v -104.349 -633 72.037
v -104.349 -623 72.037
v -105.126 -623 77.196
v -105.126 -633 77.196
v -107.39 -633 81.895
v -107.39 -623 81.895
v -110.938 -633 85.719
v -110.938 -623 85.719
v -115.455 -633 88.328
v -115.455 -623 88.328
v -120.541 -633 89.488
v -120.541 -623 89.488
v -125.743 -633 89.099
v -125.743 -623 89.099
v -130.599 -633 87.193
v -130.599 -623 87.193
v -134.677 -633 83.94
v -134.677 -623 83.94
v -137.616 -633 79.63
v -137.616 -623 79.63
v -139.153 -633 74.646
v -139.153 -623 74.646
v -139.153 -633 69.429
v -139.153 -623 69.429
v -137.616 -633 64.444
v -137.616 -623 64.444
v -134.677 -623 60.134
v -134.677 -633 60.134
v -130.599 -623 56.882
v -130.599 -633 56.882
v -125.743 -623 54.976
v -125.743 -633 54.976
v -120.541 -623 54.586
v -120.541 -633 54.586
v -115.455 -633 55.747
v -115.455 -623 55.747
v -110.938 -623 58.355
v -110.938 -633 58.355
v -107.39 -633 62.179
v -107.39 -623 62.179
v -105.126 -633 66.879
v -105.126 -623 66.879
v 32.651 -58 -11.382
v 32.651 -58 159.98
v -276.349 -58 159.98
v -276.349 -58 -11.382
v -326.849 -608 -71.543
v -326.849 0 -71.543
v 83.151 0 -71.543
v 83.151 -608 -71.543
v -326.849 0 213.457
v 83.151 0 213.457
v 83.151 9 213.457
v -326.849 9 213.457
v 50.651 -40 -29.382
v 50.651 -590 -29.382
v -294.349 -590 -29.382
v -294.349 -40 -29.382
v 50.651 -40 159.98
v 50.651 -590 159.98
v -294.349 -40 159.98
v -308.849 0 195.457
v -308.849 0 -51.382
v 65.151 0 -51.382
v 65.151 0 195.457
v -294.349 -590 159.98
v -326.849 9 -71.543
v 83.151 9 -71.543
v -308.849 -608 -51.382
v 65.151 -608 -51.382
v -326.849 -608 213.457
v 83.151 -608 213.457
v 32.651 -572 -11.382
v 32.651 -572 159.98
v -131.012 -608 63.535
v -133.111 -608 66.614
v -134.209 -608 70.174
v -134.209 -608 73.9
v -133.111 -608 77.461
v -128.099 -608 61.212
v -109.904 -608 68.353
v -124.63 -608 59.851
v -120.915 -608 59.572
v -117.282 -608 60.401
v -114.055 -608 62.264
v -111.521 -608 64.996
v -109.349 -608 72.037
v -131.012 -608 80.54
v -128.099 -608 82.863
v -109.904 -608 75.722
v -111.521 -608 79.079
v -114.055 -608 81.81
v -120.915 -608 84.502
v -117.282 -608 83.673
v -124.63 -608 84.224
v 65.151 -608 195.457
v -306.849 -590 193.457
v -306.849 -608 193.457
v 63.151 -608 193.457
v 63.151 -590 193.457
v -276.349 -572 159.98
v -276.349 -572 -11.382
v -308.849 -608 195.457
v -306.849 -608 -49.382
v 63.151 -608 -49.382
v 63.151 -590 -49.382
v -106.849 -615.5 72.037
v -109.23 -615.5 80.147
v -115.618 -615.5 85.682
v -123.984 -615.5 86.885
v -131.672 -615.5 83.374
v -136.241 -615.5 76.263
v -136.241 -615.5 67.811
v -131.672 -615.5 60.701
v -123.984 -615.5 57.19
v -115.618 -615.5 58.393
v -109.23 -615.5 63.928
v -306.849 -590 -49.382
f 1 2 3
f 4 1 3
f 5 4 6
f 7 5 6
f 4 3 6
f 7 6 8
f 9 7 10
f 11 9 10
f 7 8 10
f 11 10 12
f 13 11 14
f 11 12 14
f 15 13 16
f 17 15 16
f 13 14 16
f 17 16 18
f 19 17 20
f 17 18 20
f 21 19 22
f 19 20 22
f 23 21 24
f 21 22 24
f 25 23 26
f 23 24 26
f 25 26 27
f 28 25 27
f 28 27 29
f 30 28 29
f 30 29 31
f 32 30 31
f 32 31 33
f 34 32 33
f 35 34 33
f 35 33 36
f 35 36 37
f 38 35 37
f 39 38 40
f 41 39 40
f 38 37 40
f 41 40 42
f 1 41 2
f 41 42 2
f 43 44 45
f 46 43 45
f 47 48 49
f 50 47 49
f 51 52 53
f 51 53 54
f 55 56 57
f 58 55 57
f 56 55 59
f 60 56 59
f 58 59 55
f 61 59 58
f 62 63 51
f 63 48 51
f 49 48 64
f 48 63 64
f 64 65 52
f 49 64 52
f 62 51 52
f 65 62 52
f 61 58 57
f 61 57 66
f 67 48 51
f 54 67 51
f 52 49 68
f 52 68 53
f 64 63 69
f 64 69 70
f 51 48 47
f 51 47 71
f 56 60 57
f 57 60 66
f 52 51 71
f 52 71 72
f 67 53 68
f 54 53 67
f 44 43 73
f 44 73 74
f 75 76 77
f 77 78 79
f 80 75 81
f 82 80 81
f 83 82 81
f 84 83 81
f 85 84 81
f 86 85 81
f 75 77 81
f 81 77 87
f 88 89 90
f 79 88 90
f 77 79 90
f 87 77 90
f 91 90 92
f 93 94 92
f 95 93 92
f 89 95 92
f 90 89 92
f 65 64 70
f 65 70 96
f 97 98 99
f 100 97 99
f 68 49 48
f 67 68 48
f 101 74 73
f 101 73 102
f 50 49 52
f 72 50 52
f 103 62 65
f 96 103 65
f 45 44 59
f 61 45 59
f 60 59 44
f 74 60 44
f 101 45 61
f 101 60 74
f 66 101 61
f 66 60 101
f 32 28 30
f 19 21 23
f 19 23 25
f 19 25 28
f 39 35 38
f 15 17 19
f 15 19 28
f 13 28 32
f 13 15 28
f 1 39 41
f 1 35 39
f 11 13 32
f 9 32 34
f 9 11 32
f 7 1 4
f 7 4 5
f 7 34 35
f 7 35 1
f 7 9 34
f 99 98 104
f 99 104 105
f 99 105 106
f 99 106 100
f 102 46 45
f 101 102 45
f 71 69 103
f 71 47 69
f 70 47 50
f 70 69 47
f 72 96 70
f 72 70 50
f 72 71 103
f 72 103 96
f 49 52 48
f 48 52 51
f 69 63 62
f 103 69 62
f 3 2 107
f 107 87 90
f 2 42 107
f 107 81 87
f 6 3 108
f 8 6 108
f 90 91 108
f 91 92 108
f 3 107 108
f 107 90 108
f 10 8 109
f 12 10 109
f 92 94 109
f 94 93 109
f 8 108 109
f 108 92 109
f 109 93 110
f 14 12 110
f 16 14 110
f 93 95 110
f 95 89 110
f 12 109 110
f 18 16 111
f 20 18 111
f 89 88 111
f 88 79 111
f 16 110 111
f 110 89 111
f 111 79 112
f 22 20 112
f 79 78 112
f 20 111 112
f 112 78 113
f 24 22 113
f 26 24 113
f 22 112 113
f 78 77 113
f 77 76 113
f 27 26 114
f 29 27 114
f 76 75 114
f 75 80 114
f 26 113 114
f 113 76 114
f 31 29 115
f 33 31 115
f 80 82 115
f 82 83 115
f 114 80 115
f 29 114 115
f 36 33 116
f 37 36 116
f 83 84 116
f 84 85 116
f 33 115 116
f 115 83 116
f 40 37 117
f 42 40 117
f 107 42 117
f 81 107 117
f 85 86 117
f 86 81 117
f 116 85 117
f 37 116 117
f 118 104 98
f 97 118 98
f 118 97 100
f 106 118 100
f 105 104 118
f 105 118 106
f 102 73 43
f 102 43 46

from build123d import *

# Parameters (mm, degrees)
F0_W      = 410
F0_H      = 285
F0_W_2    = 374
F0_H_2    = 246.838547
F1_DEPTH  = 608
F2_W      = 410
F2_H      = 285
F3_DEPTH  = 9
F4_W      = 370
F4_H      = 242.838547
F5_DEPTH  = 18
F6_W      = 345
F6_H      = 189.362255
F7_DEPTH  = 550
F8_T      = -18
F9_R      = 17.5
F10_DEPTH = 25
F11_SIZE2 = 5
F11_SIZE  = 15


with BuildPart() as f1:
    # F0 (on Front) → F1 (new body)
    with BuildSketch(Plane.XZ):
        with Locations((-121.848952, 70.956648)):
            Rectangle(F0_W, F0_H)
        with Locations((-121.848952, 72.037374)):
            Rectangle(F0_W_2, F0_H_2, mode=Mode.SUBTRACT)
    extrude(amount=F1_DEPTH)


with BuildPart() as f3:
    # F2 (on face) → F3 (new body)
    with BuildSketch(Plane(origin=(0, 0, 0), x_dir=(-1, 0, 0), z_dir=(0, 1, 0))):
        with Locations((121.848952, 70.956648)):
            Rectangle(F2_W, F2_H)
    extrude(amount=F3_DEPTH)


with BuildPart() as f5:
    # F4 (on face) → F5 (new body)
    with BuildSketch(Plane.XZ.offset(608)):
        with Locations((-121.848952, 72.037374)):
            Rectangle(F4_W, F4_H)
    extrude(amount=-F5_DEPTH)


with BuildPart() as f7:
    # F6 (on face) → F7 (new body)
    with BuildSketch(Plane(origin=(0, -590, 0), x_dir=(-1, 0, 0), z_dir=(0, 1, 0))):
        with Locations((121.848952, 65.299228)):
            Rectangle(F6_W, F6_H)
    extrude(amount=F7_DEPTH)

    # F8
    f8_openings = [f7.faces().sort_by_distance(p)[0] for p in [
        (-121.848952, -315, 159.980356),
    ]]
    offset(amount=F8_T, openings=f8_openings)


with BuildPart() as f10:
    # F9 (on face) → F10 (new body)
    with BuildSketch(Plane.XZ.offset(608)):
        with Locations((-121.848952, 72.037374)):
            Circle(F9_R)
    extrude(amount=F10_DEPTH)

    # F11
    f11_edges = [f10.edges().sort_by_distance(p)[0] for p in [
        (-139.348952, -608, 72.037374),
    ]]
    chamfer(f11_edges, length=F11_SIZE, length2=F11_SIZE2)


solid = Compound([f1.part, f3.part, f5.part, f7.part, f10.part])
